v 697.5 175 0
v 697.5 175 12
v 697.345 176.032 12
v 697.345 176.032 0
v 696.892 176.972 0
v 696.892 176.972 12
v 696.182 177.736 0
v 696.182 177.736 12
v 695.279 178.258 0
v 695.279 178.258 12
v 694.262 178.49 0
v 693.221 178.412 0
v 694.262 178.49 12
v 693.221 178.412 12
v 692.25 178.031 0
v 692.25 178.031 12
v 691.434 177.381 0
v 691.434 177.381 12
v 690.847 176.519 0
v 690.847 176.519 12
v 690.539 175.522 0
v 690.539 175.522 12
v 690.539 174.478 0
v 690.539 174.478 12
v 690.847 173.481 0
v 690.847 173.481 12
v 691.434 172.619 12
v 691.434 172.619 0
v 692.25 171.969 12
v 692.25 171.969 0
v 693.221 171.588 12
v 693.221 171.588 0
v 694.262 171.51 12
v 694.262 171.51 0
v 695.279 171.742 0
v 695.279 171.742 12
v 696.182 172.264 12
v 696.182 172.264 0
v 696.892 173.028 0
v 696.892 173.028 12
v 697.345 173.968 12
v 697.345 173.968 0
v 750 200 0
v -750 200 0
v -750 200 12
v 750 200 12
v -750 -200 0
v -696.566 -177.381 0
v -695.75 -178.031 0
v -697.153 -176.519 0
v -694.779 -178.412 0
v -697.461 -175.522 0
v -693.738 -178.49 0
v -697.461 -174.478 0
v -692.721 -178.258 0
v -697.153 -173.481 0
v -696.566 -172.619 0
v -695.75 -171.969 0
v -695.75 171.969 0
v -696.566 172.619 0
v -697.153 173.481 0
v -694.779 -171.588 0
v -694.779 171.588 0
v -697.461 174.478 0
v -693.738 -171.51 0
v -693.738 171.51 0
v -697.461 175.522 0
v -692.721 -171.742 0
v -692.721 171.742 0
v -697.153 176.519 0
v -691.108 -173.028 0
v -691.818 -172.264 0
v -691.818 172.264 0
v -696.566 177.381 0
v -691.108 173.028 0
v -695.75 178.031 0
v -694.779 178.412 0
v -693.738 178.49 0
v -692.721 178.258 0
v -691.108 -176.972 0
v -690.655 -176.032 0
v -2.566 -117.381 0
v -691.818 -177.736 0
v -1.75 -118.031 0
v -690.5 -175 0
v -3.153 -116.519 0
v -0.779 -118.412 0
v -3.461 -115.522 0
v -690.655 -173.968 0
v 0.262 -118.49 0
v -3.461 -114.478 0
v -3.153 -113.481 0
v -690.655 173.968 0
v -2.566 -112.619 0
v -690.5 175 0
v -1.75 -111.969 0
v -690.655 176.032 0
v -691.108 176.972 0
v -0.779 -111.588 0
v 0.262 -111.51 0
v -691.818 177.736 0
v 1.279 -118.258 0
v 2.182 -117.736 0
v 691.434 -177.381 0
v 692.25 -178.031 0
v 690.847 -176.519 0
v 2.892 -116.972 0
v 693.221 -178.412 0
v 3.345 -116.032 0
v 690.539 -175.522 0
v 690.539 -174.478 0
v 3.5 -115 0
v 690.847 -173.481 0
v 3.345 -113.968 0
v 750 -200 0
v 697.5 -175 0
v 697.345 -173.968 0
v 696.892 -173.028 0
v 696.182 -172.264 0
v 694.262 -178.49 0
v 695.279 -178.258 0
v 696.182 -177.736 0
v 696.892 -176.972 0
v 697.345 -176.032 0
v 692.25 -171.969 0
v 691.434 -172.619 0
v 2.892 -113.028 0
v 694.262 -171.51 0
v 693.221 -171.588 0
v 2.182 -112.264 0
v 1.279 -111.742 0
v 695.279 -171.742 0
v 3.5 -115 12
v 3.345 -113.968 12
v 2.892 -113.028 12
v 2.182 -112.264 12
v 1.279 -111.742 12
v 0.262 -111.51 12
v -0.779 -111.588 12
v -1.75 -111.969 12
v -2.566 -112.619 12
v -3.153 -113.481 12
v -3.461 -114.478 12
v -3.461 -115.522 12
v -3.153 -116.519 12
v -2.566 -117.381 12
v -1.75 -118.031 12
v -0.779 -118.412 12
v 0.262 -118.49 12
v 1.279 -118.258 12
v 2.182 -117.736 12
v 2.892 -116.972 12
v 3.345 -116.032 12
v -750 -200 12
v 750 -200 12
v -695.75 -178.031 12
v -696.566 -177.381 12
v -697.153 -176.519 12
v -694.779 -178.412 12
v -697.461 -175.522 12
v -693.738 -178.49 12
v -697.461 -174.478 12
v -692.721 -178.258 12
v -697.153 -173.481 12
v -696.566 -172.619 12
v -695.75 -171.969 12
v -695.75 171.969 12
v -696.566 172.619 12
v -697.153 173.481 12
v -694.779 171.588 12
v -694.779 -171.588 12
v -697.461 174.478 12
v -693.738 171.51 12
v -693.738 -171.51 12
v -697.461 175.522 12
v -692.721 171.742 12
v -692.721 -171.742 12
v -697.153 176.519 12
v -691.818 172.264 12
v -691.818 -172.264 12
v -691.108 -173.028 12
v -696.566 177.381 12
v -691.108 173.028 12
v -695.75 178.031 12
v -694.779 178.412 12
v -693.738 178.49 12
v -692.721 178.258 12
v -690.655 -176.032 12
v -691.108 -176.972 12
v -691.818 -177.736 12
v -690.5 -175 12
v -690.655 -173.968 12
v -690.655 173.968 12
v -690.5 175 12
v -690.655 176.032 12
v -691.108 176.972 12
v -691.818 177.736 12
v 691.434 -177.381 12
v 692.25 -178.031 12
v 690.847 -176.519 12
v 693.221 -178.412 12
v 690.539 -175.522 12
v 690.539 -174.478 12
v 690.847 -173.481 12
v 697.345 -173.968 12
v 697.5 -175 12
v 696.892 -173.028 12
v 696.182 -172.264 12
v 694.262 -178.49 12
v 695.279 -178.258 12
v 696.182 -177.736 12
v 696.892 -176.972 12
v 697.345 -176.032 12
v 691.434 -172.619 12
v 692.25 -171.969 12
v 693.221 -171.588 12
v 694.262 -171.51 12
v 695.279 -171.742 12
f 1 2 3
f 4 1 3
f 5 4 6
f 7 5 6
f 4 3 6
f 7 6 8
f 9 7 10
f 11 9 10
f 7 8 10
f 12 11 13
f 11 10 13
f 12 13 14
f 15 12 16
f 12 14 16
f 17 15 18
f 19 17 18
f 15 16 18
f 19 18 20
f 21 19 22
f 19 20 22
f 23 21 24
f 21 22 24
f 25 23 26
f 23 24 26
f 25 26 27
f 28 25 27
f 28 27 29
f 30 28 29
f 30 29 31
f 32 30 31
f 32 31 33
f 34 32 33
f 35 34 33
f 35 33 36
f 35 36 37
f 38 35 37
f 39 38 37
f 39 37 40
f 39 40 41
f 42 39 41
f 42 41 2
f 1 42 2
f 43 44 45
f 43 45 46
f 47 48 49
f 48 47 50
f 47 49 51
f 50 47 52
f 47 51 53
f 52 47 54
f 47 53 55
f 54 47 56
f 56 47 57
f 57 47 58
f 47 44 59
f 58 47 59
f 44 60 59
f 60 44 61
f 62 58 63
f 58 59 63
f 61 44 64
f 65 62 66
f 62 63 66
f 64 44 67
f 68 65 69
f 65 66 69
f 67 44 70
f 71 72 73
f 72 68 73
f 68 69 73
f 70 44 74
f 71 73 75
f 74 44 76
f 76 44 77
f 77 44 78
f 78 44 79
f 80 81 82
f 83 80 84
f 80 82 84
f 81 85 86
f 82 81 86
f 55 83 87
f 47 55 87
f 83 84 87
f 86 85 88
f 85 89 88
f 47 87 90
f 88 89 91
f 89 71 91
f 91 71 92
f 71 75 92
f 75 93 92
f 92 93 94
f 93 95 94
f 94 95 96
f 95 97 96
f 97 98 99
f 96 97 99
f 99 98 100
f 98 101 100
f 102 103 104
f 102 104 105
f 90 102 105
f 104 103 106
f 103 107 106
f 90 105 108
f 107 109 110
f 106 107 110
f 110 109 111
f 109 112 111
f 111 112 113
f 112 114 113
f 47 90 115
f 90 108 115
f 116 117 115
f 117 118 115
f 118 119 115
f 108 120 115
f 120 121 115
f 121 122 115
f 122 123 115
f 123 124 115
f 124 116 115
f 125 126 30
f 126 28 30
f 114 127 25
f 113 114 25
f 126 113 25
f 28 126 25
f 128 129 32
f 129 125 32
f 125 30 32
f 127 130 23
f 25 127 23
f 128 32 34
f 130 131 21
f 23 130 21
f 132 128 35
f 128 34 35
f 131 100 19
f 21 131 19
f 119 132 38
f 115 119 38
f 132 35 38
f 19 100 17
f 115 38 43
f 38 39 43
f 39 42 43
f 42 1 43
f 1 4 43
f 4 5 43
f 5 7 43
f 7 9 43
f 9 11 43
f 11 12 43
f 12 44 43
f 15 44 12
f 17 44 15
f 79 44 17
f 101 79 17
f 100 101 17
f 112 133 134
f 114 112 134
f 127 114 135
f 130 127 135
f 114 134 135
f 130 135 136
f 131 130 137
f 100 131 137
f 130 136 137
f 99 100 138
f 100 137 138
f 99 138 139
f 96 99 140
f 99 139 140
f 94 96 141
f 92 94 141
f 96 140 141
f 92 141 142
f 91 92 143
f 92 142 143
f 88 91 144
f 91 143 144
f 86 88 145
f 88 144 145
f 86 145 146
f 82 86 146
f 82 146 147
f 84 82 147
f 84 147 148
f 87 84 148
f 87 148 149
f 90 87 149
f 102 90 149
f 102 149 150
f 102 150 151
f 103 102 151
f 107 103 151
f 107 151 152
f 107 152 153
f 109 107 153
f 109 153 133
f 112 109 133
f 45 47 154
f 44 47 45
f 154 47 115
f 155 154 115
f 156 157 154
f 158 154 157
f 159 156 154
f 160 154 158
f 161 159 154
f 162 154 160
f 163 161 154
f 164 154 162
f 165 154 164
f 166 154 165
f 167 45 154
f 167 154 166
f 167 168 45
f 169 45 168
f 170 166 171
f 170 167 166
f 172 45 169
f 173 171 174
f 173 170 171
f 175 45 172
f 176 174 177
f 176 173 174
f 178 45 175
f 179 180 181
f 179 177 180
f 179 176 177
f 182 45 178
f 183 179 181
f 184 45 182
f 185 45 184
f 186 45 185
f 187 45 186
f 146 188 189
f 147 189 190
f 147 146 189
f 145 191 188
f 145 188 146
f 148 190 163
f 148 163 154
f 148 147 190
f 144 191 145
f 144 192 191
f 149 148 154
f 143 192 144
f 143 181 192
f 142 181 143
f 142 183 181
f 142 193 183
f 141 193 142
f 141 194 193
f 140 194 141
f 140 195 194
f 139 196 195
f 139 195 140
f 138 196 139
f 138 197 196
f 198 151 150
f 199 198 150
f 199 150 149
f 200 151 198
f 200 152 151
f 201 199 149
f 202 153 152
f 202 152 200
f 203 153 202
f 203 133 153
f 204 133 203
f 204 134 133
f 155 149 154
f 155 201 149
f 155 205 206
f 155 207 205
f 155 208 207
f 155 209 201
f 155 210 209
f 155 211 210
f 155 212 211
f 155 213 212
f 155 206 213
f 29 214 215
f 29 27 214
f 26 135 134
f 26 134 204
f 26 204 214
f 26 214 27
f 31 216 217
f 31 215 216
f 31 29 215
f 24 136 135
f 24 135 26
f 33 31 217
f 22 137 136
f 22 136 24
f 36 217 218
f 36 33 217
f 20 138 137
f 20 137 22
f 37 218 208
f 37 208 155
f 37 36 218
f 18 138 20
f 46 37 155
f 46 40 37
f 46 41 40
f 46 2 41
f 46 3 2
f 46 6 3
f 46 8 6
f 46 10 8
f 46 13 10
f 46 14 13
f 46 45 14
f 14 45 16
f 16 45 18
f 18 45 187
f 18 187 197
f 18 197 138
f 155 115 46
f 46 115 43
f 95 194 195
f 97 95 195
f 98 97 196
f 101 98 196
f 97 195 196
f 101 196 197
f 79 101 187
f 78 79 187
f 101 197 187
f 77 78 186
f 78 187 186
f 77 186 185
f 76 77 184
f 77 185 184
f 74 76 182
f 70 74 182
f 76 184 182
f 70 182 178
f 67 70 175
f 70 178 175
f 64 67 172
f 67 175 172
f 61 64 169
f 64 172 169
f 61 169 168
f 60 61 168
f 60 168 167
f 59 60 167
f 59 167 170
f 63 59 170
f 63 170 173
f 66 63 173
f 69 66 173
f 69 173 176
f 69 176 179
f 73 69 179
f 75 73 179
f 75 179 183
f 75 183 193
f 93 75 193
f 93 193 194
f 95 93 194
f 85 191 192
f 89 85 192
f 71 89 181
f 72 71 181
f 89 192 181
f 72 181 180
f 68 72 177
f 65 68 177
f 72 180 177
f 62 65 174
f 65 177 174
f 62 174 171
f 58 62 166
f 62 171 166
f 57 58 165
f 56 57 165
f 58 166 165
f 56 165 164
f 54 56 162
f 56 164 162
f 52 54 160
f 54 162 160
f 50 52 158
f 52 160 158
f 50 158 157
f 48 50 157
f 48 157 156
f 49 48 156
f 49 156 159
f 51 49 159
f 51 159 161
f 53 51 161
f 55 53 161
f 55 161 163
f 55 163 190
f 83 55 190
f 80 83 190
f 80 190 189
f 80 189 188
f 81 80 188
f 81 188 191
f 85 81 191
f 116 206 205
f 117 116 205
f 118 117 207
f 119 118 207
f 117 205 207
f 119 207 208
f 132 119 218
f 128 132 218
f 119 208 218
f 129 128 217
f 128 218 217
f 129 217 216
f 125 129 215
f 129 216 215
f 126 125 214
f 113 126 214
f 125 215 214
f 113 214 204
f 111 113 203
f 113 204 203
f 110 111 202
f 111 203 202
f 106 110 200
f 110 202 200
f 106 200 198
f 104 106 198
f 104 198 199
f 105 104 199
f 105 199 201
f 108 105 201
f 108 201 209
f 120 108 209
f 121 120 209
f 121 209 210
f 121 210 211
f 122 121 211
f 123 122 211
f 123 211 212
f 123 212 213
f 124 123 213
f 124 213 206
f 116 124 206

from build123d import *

# Parameters (mm, degrees)
SKETCH1_W                   = 1500
SKETCH1_H                   = 400
RAWMATERIAL_DEPTH           = 12
F_7_0_7_FRAME_MOUNT_HOLES_D = 7


with BuildPart() as part:
    # Sketch1 → RawMaterial (new body)
    with BuildSketch(Plane.XY):
        Rectangle(SKETCH1_W, SKETCH1_H)
    extrude(amount=RAWMATERIAL_DEPTH)

    # Ø7.0 (7) Frame Mount Holes (through all)
    with Locations(Plane(origin=(0, 0, 0), x_dir=(-1, 0, 0), z_dir=(0, 0, -1))):
        with Locations((-694, 175), (-694, -175), (694, -175), (694, 175), (0, -115)):
            Hole(F_7_0_7_FRAME_MOUNT_HOLES_D / 2)


solid = part.part
